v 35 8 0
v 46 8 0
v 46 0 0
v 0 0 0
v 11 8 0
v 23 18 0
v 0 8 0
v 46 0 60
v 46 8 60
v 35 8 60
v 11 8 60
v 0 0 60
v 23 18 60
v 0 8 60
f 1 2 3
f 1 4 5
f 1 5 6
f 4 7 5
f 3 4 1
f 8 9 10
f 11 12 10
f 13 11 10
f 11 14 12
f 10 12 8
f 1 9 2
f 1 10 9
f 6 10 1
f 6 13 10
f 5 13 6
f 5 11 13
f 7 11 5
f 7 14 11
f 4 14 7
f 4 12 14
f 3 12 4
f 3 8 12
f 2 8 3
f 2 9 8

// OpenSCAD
$fn = 32;

// ----------------------------------------------------------------------
// V guide rail: vrib, 46 mm wide
// ----------------------------------------------------------------------

// --- parameters (mm) ---
rail_w = 46;              // rail width, X
base_t = 8;               // base plate thickness
v_depth = 10;             // V feature depth / height
v_half_w = 12;            // half width of the V at the base face
plate_t = 60;             // rail length, Z (the extrusion height)

profile = [[0, 0], [46, 0], [46, 8], [35, 8], [23, 18], [11, 8], [0, 8]];  // primary outline, 7 points, counter clockwise

// --- the one profile operation ---
linear_extrude(height = plate_t) polygon(points = profile);
